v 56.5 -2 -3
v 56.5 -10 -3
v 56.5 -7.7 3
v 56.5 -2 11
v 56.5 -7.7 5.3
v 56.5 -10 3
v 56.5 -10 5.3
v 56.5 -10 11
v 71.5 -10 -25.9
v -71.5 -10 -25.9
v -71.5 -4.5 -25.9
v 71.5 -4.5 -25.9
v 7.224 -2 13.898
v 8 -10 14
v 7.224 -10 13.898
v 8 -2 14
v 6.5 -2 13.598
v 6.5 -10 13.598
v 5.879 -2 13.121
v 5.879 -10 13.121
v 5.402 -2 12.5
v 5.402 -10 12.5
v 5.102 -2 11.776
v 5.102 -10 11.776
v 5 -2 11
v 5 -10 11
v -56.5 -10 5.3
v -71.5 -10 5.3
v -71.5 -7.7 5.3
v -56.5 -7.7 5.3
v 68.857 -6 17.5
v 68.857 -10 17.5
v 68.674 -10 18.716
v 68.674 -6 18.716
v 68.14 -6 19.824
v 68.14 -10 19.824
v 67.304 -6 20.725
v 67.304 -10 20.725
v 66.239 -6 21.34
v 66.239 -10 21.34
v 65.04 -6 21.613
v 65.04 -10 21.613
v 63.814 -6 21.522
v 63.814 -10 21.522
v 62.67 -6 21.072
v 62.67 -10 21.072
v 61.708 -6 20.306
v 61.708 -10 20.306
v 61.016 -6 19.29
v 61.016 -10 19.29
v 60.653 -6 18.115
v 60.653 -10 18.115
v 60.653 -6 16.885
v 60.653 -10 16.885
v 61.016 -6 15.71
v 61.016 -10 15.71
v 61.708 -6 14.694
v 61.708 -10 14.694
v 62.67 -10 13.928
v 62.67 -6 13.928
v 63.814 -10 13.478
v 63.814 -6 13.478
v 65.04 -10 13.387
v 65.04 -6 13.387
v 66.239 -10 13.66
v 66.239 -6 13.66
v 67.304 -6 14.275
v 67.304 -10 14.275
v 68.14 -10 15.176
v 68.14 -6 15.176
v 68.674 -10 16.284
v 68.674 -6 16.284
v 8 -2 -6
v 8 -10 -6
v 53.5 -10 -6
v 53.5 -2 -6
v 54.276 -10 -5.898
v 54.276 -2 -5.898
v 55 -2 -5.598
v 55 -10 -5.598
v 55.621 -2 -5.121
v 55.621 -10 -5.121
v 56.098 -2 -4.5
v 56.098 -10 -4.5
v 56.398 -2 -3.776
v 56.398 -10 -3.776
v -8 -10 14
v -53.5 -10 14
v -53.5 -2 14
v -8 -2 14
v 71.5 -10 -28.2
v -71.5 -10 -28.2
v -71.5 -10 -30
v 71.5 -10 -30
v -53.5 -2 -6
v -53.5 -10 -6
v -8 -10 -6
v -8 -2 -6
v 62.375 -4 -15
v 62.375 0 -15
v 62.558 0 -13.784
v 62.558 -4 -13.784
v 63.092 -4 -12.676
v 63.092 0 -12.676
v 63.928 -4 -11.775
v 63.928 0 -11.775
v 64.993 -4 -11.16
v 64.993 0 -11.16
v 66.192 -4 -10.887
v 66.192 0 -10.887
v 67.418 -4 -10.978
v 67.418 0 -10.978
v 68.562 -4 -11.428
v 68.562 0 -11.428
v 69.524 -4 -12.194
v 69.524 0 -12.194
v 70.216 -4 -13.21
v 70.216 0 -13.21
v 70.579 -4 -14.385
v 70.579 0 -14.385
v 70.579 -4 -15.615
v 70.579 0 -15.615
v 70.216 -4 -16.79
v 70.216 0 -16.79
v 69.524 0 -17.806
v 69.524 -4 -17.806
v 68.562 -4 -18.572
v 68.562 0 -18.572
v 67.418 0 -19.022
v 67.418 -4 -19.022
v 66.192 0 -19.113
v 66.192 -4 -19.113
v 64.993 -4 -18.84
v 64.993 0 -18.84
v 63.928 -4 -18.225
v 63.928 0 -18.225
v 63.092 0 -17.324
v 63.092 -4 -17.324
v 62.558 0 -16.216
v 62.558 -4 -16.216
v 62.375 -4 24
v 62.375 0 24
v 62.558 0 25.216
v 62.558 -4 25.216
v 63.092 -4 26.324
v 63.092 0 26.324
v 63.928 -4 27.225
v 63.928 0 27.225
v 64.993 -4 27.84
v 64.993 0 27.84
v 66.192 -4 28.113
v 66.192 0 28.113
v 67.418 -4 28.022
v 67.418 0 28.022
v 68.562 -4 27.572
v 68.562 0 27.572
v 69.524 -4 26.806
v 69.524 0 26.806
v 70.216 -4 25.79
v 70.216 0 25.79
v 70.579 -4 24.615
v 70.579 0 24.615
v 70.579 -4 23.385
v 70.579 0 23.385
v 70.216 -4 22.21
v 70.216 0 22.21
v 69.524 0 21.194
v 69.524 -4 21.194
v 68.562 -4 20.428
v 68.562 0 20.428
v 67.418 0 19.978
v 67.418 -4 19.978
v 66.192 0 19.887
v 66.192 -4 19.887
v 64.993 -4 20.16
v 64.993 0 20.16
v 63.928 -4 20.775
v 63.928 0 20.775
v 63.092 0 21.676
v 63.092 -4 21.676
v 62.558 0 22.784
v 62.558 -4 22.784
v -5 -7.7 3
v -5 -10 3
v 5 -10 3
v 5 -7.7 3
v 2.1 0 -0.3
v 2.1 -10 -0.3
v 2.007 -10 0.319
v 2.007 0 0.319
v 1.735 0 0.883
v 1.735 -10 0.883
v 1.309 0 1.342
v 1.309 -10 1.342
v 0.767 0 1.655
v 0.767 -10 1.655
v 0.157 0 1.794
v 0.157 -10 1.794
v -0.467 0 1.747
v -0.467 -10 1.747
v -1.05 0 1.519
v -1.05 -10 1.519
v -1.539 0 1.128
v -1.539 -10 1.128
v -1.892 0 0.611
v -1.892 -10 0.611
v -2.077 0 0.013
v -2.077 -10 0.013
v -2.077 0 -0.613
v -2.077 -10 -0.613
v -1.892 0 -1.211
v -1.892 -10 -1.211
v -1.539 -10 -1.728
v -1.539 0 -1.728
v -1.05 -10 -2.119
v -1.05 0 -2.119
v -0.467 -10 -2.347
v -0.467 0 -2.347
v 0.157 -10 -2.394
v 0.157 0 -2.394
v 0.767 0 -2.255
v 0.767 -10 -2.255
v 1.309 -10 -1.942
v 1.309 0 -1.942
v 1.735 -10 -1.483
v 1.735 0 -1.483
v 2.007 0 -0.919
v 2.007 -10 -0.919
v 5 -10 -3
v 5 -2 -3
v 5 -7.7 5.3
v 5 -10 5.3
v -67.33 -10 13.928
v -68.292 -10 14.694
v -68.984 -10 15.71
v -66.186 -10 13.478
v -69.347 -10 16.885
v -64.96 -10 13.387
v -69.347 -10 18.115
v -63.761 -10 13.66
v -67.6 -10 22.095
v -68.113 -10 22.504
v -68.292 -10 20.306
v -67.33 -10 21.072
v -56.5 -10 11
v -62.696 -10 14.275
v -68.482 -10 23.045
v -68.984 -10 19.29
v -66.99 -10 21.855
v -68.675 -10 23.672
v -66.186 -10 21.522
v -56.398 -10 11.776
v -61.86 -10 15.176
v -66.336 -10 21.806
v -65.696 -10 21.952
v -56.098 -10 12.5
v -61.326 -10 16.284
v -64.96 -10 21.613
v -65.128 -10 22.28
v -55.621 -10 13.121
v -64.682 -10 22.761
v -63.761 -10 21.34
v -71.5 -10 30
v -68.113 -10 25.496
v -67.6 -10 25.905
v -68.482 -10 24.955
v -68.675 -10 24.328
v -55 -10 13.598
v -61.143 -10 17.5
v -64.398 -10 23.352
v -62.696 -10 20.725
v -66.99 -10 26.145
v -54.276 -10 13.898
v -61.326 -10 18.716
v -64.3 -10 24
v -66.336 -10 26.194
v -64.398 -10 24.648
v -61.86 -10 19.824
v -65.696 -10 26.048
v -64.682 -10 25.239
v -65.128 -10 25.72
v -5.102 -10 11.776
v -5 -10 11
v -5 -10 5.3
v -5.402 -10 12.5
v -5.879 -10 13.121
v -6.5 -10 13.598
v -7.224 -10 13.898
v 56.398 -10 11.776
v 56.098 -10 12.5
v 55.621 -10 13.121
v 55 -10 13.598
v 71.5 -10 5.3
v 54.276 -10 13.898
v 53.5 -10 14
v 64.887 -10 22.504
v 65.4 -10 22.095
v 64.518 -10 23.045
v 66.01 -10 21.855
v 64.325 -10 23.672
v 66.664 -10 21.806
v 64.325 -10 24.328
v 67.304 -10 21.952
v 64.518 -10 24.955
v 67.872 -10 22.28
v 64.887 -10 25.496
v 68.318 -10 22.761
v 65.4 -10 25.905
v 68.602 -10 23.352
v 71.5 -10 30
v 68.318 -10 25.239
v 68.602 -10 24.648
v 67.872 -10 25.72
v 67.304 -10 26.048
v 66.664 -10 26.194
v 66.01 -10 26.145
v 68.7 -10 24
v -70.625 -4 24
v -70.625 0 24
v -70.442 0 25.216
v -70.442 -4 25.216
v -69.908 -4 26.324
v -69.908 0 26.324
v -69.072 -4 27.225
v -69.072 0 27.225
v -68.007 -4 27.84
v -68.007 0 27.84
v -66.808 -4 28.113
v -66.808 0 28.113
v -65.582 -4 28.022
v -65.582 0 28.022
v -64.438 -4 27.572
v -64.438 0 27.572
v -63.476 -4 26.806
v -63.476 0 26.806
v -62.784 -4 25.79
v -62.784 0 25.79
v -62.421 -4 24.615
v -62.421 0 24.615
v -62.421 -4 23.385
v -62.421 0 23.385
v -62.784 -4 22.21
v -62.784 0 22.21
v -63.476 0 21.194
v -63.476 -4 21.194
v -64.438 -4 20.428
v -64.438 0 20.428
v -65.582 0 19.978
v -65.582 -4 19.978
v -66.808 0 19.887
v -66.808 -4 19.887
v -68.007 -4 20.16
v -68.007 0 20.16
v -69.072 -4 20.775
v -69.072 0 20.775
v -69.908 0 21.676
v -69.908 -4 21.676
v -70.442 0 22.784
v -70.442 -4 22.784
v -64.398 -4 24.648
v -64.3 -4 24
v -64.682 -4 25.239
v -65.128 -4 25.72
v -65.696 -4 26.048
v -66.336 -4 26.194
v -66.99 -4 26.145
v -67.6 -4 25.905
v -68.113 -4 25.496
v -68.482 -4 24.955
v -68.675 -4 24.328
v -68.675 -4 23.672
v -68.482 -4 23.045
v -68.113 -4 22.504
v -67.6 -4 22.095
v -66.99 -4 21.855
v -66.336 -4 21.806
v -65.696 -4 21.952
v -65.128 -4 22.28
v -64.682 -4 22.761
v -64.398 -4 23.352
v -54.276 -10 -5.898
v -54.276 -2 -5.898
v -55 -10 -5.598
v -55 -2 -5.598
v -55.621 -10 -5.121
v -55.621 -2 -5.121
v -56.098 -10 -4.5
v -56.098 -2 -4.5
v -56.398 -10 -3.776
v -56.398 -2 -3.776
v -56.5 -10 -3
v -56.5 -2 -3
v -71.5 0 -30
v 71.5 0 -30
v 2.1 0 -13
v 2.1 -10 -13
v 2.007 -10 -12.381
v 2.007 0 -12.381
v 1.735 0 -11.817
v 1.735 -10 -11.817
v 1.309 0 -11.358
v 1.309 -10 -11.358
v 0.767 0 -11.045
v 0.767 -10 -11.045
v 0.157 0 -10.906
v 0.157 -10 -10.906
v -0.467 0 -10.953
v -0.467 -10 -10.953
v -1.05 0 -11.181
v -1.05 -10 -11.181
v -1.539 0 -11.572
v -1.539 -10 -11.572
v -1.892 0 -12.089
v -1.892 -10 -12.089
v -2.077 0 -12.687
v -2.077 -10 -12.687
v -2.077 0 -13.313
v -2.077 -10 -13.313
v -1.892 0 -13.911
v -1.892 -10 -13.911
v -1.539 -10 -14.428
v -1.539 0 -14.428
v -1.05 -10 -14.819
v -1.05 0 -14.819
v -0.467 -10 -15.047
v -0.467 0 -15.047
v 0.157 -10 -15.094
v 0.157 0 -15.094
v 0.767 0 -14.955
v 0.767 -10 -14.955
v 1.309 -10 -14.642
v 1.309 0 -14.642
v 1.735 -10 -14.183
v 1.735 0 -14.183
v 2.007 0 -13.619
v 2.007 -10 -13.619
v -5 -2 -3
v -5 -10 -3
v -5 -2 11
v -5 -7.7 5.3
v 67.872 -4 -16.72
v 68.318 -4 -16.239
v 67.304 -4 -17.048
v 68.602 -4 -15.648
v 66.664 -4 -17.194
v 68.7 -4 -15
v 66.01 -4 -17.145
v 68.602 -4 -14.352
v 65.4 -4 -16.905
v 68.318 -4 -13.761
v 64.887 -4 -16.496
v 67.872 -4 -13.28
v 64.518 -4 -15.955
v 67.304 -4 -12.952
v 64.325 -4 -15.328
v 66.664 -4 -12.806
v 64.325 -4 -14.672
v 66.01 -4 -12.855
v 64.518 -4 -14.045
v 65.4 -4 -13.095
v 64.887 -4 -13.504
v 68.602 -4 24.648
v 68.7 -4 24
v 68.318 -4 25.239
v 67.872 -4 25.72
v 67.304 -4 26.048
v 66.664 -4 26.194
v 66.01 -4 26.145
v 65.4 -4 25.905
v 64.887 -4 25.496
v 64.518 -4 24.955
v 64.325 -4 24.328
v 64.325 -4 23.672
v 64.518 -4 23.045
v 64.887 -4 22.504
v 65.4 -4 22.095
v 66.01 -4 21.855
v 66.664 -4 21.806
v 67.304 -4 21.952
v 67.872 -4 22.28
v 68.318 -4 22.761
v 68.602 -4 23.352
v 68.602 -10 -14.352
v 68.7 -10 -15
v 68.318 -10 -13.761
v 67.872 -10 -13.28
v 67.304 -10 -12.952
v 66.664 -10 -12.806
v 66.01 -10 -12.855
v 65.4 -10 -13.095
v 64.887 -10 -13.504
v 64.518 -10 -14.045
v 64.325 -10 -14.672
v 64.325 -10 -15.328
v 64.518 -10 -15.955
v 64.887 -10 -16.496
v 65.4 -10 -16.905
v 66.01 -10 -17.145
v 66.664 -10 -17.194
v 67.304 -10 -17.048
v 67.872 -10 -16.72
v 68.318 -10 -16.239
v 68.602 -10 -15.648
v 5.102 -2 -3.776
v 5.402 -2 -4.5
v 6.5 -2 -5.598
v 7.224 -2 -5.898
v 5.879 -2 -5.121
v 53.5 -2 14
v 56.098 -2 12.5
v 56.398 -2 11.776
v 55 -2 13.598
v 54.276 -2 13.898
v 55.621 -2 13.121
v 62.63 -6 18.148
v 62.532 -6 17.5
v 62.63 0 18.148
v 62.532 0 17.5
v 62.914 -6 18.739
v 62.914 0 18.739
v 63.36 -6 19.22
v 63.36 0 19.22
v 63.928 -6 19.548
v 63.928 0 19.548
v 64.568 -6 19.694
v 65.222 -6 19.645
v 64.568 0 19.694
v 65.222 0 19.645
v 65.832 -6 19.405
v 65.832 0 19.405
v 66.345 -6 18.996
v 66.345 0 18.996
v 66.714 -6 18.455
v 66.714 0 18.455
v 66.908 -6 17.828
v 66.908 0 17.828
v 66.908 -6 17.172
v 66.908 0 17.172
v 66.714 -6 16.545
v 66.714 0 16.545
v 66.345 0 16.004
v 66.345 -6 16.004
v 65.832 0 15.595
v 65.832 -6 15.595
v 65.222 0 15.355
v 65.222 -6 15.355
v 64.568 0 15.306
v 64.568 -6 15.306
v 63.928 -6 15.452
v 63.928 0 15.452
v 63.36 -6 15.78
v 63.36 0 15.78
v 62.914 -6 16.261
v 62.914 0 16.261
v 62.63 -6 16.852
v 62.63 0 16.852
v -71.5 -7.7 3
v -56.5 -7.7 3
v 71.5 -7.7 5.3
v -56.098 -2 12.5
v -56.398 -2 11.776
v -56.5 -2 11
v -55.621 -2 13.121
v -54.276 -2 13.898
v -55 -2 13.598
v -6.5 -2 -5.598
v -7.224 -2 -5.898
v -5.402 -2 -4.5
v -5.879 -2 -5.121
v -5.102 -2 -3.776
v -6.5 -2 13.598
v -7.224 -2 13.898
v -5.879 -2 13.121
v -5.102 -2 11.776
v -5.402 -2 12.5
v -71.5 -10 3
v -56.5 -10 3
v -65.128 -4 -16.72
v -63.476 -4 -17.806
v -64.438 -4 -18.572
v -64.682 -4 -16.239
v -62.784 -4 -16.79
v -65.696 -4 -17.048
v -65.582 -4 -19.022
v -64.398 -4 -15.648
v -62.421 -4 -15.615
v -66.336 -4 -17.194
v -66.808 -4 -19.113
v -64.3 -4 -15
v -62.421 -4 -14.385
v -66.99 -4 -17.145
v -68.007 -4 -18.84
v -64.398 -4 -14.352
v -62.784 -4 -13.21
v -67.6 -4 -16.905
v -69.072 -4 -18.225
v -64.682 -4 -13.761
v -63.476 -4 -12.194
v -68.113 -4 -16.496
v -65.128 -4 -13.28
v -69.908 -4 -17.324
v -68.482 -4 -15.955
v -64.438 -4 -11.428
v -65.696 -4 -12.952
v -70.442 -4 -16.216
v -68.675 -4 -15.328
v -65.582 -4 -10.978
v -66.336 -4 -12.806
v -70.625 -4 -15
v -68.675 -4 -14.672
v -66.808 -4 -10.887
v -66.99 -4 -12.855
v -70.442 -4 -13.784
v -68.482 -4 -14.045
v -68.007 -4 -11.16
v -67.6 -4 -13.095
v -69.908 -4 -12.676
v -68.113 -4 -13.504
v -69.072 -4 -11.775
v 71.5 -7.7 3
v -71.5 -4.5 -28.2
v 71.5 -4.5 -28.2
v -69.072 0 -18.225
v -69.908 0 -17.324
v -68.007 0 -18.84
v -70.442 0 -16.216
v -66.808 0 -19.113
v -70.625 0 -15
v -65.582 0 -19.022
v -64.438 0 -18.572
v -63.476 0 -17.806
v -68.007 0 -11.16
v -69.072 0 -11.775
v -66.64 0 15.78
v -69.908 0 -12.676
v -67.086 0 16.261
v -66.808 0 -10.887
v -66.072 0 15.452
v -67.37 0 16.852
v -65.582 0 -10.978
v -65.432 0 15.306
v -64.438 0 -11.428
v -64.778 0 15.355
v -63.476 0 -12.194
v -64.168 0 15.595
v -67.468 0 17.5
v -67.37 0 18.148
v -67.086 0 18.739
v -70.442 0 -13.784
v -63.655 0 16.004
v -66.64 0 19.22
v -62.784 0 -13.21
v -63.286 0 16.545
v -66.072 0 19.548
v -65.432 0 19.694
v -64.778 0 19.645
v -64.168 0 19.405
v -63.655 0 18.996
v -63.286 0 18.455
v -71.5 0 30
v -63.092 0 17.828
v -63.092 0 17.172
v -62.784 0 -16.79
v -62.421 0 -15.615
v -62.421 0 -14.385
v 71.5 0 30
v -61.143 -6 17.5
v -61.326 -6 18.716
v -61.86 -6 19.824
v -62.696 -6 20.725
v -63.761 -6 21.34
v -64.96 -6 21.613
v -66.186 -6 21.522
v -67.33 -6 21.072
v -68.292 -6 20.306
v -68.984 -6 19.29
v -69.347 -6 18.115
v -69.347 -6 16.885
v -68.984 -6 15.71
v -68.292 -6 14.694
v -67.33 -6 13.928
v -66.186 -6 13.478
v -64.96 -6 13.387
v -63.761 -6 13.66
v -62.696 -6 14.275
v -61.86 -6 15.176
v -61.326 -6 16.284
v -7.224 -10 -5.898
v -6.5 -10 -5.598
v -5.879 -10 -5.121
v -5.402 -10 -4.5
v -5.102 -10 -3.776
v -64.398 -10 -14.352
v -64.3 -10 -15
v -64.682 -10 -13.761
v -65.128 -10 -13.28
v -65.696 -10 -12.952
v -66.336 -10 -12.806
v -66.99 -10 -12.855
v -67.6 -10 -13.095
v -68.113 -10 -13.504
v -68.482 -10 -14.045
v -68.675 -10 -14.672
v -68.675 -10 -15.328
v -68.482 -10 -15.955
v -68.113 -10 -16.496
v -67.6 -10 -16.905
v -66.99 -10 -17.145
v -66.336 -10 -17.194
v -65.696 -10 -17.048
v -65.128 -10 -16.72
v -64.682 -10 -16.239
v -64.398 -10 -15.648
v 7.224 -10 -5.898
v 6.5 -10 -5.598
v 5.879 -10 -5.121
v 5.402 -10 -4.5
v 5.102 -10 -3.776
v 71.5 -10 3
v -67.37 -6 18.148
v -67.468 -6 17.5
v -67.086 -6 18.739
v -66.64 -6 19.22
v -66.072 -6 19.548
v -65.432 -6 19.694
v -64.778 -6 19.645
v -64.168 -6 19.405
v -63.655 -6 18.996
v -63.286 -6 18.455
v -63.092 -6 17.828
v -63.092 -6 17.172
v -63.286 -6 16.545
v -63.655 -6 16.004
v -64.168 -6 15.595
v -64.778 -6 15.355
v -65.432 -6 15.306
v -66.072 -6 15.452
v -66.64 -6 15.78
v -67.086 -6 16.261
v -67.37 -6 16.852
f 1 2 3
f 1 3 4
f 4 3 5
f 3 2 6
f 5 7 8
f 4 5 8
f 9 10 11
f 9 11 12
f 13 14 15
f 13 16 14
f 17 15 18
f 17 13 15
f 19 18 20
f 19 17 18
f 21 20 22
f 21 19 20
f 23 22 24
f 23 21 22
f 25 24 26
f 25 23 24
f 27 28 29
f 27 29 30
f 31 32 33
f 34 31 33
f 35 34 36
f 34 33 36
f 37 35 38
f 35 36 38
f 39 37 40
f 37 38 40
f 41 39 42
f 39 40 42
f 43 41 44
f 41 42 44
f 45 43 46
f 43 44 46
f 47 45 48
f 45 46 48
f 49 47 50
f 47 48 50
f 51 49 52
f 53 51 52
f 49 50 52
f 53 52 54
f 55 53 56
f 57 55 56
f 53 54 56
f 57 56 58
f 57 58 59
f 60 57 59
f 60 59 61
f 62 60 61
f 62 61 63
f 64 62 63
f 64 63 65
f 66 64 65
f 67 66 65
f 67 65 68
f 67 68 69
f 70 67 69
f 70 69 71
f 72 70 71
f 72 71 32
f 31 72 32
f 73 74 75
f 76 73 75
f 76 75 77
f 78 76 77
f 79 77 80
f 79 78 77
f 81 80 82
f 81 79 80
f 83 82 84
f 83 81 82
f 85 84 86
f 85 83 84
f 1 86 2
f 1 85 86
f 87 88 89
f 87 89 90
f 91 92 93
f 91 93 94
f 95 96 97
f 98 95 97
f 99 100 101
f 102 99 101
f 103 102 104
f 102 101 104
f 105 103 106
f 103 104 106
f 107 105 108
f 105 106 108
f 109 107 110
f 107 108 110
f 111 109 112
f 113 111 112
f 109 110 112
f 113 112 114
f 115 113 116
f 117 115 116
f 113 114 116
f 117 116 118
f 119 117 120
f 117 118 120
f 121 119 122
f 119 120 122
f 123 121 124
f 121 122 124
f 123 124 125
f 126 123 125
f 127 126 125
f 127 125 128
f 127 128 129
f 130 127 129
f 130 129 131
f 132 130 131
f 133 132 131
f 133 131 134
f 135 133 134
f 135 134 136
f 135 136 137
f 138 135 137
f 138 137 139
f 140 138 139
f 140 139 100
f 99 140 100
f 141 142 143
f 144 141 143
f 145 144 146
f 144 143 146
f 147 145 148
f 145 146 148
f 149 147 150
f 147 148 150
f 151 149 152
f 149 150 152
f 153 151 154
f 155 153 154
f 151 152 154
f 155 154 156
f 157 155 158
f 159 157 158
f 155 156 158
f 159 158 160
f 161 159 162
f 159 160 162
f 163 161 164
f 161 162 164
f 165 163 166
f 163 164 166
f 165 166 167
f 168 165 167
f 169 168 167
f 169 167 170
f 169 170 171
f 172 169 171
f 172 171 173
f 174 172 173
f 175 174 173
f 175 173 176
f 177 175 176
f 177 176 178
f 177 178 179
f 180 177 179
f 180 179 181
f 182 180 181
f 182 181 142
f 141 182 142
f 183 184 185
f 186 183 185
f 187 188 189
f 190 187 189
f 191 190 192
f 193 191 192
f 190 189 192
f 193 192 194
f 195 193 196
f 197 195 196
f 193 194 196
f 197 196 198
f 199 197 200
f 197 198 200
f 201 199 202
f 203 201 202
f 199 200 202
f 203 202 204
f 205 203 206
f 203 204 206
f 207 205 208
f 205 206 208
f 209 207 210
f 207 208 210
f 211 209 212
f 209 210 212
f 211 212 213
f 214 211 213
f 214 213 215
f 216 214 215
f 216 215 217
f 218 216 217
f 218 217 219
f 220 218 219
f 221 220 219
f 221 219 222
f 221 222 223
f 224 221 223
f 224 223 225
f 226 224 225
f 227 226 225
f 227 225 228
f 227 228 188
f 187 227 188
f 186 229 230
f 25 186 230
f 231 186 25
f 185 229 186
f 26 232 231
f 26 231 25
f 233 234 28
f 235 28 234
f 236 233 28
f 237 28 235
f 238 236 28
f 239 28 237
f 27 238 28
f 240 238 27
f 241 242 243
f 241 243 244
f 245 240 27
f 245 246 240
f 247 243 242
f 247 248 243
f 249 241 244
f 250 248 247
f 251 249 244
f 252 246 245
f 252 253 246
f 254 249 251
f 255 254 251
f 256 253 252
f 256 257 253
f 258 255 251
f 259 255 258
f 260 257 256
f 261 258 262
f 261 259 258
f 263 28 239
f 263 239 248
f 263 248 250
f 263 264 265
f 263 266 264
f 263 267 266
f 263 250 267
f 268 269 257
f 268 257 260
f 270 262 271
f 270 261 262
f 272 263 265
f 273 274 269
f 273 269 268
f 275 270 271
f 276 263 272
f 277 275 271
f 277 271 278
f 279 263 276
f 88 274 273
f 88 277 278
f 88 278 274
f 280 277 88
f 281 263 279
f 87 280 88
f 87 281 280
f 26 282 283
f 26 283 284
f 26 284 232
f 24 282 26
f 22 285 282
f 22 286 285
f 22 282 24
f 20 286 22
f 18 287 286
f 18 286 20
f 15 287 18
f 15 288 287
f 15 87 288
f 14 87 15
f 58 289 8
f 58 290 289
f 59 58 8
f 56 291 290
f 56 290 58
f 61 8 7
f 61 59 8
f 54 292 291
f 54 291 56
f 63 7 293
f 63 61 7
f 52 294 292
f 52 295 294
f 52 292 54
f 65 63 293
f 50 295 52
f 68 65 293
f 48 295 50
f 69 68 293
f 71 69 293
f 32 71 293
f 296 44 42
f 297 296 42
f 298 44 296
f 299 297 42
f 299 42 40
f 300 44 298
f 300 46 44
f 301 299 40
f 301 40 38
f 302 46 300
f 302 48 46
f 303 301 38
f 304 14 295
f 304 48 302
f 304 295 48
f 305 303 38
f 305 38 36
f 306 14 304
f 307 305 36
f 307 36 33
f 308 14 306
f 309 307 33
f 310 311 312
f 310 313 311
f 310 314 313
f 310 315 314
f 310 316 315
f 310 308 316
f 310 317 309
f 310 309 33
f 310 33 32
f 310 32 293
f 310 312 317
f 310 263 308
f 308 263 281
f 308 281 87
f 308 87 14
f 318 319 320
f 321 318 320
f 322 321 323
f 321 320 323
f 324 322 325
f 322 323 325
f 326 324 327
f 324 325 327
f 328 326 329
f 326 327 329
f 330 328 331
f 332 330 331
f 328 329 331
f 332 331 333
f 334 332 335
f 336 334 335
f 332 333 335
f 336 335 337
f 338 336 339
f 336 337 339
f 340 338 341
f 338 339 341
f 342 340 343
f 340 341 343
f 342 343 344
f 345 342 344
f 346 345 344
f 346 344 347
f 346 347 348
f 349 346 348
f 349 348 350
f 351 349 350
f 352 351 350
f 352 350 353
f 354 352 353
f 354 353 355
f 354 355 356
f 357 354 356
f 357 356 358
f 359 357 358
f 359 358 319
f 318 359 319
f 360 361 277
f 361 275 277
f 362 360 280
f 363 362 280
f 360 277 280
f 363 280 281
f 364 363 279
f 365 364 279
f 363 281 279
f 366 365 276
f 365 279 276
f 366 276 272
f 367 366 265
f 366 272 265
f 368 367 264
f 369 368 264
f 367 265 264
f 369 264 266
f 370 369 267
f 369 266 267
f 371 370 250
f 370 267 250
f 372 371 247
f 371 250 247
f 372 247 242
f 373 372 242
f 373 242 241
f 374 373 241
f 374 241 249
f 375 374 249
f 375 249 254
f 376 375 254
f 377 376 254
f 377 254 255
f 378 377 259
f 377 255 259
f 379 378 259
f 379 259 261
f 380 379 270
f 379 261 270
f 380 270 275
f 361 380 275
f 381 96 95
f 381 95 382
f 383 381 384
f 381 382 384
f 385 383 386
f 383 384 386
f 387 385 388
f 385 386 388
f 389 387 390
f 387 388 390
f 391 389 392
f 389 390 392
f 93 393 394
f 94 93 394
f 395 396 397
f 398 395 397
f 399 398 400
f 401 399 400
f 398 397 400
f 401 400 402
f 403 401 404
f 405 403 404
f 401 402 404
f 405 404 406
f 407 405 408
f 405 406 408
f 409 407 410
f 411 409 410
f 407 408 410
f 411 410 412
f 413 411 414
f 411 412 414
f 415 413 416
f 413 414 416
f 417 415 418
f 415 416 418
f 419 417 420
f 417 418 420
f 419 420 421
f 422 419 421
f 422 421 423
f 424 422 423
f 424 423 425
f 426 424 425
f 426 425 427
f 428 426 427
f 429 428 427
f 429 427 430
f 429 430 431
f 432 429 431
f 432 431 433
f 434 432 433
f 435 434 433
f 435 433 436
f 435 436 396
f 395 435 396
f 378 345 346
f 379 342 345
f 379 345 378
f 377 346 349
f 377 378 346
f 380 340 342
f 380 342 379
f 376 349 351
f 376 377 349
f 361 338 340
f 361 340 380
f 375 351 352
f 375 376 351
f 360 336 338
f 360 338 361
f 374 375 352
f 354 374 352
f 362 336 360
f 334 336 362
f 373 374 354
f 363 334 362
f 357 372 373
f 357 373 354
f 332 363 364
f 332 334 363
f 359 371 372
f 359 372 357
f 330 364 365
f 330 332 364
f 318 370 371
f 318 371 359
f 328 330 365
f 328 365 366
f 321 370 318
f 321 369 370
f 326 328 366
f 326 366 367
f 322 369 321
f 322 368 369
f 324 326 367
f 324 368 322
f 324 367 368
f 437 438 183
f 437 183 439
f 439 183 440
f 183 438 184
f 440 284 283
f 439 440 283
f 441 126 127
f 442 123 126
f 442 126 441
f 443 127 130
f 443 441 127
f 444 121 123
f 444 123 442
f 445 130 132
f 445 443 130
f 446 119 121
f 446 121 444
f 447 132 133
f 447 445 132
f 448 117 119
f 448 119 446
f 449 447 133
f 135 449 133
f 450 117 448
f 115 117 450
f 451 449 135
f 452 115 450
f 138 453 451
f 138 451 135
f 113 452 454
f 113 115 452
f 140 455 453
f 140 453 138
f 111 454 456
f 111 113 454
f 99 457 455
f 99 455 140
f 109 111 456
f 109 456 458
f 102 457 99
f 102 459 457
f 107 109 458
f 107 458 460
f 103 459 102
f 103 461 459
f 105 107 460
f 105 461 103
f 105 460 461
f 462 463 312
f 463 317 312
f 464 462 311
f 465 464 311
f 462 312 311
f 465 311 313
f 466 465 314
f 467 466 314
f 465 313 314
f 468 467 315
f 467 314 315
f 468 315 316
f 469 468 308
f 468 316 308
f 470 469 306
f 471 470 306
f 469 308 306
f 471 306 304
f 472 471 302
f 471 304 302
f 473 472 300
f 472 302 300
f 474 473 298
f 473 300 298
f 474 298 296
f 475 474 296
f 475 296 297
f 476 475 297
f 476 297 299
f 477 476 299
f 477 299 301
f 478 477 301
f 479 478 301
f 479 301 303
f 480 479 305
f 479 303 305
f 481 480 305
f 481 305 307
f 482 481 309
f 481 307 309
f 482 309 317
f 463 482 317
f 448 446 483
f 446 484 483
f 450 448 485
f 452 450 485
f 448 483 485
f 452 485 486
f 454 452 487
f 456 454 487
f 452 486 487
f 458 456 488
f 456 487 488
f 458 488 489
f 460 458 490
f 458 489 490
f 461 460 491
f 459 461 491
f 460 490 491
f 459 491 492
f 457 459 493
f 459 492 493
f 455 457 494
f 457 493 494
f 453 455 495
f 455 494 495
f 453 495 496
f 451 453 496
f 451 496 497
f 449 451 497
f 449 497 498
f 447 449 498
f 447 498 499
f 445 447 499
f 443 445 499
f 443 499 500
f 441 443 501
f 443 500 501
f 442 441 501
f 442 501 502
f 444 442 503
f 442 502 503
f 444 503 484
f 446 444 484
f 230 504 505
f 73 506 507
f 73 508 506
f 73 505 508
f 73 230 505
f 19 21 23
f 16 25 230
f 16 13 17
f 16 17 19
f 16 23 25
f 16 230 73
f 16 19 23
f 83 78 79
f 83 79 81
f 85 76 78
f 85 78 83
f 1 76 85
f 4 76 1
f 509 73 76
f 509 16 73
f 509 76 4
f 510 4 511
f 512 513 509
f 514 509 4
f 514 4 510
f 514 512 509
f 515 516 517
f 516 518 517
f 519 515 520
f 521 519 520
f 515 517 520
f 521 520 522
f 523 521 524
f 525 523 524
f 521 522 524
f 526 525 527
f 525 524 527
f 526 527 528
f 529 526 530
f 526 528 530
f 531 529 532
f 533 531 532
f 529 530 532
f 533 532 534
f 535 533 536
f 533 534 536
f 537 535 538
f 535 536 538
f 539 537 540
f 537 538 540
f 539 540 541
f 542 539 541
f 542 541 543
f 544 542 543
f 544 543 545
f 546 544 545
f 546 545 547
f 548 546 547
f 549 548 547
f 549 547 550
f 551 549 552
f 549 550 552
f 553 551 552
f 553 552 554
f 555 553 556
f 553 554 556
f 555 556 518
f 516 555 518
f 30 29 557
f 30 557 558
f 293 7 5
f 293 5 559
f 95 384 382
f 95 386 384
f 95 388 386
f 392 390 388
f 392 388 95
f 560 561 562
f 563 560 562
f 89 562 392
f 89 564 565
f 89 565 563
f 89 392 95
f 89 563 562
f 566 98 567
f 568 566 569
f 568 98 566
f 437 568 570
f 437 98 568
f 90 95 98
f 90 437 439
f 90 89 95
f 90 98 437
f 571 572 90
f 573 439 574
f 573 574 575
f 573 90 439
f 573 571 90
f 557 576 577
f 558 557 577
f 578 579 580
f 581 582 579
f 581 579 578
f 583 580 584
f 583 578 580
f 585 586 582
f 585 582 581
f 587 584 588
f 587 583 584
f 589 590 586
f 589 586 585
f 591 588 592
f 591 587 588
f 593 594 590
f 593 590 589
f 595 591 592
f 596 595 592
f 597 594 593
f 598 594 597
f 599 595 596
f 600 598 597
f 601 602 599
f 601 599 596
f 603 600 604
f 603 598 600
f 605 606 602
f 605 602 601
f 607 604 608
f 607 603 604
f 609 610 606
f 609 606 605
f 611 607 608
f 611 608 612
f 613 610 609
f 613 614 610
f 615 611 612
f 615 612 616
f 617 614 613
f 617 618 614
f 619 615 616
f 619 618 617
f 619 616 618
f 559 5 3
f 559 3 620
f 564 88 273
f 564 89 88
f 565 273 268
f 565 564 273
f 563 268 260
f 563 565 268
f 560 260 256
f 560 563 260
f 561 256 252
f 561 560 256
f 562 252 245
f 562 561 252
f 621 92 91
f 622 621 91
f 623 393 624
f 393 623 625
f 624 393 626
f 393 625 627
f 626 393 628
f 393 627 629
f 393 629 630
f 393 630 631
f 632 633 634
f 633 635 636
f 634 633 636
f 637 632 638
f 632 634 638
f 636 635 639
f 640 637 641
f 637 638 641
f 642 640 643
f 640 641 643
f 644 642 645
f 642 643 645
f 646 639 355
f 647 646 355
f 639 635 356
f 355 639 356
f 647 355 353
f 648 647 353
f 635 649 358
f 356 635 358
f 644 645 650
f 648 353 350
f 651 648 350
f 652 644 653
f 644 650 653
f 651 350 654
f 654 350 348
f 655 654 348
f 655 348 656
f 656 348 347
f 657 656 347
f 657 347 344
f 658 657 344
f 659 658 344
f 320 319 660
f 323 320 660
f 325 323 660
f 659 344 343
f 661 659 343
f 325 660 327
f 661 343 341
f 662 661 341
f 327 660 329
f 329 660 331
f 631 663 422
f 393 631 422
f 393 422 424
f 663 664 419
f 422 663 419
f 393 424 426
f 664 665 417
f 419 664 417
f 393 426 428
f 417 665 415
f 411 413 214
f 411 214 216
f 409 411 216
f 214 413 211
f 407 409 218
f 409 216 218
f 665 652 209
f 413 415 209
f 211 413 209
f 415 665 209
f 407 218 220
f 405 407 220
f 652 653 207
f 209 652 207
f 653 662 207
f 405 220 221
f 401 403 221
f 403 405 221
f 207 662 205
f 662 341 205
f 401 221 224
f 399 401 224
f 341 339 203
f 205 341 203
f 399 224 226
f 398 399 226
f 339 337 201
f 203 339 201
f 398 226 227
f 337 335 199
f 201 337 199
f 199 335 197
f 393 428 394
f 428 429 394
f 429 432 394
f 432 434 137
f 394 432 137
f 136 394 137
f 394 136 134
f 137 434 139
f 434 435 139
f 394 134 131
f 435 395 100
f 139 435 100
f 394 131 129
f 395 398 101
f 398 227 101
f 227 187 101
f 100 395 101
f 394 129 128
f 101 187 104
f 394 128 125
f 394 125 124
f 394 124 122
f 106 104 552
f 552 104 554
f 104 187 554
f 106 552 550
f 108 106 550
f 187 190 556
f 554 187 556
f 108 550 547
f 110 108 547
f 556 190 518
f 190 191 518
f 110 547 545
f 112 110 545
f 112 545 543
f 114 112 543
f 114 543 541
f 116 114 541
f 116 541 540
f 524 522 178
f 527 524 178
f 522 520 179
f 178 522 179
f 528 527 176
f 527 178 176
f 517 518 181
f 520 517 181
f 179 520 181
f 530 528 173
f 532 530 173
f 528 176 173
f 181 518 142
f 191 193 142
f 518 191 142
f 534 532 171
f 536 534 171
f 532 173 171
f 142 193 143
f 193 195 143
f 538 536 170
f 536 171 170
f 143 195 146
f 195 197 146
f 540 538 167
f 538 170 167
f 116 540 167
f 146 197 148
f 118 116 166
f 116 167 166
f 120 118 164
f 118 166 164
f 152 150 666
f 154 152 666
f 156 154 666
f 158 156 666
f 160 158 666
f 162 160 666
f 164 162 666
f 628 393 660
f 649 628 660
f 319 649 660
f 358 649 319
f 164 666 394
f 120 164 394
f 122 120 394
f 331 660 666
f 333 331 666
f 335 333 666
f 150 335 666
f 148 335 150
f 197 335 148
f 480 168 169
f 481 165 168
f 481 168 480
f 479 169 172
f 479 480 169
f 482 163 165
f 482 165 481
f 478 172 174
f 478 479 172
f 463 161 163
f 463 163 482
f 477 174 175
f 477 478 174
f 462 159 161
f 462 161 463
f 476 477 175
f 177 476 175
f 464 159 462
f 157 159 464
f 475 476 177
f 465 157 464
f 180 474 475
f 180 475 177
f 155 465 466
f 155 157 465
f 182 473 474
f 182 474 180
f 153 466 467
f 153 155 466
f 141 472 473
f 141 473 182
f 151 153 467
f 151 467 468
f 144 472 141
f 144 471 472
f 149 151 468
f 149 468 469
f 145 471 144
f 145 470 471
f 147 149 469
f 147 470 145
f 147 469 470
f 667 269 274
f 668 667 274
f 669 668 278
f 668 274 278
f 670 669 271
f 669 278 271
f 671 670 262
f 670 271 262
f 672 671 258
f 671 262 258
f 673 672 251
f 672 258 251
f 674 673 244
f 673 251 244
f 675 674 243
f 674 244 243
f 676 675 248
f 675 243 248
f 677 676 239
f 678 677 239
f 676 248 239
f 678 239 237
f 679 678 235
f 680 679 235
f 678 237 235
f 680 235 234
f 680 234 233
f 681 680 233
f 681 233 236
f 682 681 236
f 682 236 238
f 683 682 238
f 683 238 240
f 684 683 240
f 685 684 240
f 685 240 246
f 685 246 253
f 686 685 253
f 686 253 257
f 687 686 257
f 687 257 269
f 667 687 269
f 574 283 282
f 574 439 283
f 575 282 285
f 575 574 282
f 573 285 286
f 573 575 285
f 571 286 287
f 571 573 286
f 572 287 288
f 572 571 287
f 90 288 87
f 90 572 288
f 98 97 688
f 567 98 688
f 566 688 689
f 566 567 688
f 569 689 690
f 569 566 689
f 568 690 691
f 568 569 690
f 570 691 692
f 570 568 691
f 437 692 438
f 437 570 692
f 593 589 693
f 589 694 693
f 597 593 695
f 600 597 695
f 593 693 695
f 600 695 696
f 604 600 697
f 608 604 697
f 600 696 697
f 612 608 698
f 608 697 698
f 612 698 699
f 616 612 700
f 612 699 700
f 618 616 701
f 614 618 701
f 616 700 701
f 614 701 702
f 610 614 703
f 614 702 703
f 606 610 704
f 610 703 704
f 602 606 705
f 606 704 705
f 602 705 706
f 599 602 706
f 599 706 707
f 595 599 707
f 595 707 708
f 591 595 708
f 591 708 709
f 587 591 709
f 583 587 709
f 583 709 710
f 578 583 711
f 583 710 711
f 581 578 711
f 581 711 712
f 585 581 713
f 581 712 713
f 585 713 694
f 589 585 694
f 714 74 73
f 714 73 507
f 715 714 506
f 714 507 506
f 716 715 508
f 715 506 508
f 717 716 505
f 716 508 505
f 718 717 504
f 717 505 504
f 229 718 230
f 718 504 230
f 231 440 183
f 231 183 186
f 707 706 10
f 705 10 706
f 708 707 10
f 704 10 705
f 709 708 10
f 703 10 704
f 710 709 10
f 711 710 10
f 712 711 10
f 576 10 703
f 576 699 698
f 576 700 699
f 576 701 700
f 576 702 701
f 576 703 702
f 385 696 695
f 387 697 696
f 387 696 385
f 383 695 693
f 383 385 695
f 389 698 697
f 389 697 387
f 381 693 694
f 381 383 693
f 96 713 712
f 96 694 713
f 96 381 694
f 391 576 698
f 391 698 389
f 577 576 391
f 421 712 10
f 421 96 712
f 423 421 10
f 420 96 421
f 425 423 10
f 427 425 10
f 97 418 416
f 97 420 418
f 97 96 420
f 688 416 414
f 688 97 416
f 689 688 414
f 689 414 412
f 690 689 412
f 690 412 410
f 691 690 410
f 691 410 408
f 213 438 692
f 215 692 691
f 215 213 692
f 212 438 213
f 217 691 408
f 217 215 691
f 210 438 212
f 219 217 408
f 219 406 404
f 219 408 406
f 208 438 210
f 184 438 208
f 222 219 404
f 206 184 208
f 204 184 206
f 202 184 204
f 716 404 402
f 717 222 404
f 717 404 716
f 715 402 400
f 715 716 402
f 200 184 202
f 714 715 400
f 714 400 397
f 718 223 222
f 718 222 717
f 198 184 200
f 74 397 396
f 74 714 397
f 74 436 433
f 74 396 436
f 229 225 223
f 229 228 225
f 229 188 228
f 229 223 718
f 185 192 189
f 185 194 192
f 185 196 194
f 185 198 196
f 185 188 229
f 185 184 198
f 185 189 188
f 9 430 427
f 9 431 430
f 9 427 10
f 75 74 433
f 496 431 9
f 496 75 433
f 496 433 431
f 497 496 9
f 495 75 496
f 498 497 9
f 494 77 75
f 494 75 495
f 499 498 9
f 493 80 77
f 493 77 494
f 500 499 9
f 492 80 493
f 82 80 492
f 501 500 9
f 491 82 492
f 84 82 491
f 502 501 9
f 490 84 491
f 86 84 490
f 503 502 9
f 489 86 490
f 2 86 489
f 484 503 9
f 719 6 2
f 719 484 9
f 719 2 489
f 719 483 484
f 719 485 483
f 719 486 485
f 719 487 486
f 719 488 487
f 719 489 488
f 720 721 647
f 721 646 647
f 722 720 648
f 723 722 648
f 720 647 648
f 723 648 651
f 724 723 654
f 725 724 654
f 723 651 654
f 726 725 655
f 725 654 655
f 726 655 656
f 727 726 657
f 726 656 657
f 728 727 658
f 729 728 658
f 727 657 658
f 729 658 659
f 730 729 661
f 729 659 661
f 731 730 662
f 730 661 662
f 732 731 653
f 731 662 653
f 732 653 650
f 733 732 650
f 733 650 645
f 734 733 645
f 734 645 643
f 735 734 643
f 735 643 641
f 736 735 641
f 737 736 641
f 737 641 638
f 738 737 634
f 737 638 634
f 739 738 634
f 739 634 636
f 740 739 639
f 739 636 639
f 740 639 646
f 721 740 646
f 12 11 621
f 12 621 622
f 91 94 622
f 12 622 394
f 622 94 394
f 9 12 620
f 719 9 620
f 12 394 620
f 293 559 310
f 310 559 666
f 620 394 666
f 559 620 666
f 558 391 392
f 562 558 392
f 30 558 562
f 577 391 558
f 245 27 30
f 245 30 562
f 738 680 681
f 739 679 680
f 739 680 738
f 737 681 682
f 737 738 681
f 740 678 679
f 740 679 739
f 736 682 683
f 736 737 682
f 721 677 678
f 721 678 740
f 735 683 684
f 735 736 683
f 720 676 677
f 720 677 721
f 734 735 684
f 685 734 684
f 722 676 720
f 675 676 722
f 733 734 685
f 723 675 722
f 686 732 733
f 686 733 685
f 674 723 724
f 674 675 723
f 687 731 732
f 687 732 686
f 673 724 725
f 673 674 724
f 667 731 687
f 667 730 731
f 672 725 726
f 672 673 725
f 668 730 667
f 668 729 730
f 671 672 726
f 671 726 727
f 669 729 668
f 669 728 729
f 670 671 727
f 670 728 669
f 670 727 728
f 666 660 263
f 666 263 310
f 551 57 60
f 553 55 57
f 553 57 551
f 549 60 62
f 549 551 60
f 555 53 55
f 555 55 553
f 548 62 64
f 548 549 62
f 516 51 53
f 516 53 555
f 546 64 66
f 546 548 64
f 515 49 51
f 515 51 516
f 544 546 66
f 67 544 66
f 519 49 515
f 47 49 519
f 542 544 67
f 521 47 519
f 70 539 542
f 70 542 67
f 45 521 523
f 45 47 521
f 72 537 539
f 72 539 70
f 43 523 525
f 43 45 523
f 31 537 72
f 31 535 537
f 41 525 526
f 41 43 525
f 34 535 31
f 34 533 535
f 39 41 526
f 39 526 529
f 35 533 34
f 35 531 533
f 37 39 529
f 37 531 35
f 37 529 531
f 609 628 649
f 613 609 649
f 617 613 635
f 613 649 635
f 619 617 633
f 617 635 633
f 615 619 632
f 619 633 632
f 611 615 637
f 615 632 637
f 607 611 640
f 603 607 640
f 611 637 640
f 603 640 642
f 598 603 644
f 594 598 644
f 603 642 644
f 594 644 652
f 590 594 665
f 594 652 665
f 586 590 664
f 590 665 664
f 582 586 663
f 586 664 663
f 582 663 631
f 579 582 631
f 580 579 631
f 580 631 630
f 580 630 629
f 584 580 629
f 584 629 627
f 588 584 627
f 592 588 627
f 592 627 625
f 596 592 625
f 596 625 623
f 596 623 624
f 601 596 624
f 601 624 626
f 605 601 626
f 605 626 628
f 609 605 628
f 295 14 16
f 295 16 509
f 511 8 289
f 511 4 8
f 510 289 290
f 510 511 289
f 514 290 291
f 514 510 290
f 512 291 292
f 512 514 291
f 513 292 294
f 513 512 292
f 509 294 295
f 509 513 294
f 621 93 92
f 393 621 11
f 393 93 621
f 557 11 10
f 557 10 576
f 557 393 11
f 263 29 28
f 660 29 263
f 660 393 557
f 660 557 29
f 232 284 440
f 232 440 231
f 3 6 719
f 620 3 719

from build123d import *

# Parameters (mm, degrees)
F0_W            = 143
F0_H            = 60
F1_DEPTH        = 10
F2_W            = 51.5
F2_H            = 20
F3_DEPTH        = 8
F4_R            = 3
F5_W            = 143
F5_H            = 2.3
F6_DEPTH        = 5.5
F7_W            = 143
F7_H            = 2.3
F8_DEPTH        = 2.3
F10_D           = 4.4
F10_CBORE_D     = 8.25
F10_CBORE_DEPTH = 4
F12_D           = 4.4
F12_CBORE_D     = 8.25
F12_CBORE_DEPTH = 4
F14_D           = 4.2


with BuildPart() as f1:
    # F0 (on Front) → F1 (new body)
    with BuildSketch(Plane.XZ):
        Rectangle(F0_W, F0_H)
    extrude(amount=F1_DEPTH)

    # F2 (on face) → F3 (cut)
    with BuildSketch(Plane.XZ.offset(10)):
        with Locations((-30.75, 4)):
            Rectangle(F2_W, F2_H)
        with Locations((30.75, 4)):
            Rectangle(F2_W, F2_H)
    extrude(amount=-F3_DEPTH, mode=Mode.SUBTRACT)

    # F4
    f4_edges = [f1.edges().sort_by_distance(p)[0] for p in [
        (-56.5, -6, 14),
        (-5, -6, -6),
        (56.5, -6, -6),
        (-5, -6, 14),
        (56.5, -6, 14),
        (-56.5, -6, -6),
        (5, -6, -6),
        (5, -6, 14),
    ]]
    fillet(f4_edges, radius=F4_R)

    # F5 (on face) → F6 (cut)
    with BuildSketch(Plane.XZ.offset(10)):
        with Locations((0, -27.05)):
            Rectangle(F5_W, F5_H)
    extrude(amount=-F6_DEPTH, mode=Mode.SUBTRACT)

    # F7 (on face) → F8 (cut)
    with BuildSketch(Plane.XZ.offset(10)):
        with Locations((0, 4.15)):
            Rectangle(F7_W, F7_H)
    extrude(amount=-F8_DEPTH, mode=Mode.SUBTRACT)

    # F10 (through all)
    with Locations(Plane(origin=(0, 0, 0), x_dir=(-1, 0, 0), z_dir=(0, 1, 0))):
        with Locations((-66.5, 24), (-66.5, -15), (66.5, -15), (66.5, 24)):
            CounterBoreHole(F10_D / 2, F10_CBORE_D / 2, F10_CBORE_DEPTH)

    # F12 (through all)
    with Locations(Plane.XZ.offset(10)):
        with Locations((-65.267855823, 17.5), (64.732144177, 17.5)):
            CounterBoreHole(F12_D / 2, F12_CBORE_D / 2, F12_CBORE_DEPTH)

    # F14 (through all)
    with Locations(Plane(origin=(0, 0, 0), x_dir=(-1, 0, 0), z_dir=(0, 1, 0))):
        with Locations((0, -0.3), (0, -13)):
            Hole(F14_D / 2)


solid = f1.part
